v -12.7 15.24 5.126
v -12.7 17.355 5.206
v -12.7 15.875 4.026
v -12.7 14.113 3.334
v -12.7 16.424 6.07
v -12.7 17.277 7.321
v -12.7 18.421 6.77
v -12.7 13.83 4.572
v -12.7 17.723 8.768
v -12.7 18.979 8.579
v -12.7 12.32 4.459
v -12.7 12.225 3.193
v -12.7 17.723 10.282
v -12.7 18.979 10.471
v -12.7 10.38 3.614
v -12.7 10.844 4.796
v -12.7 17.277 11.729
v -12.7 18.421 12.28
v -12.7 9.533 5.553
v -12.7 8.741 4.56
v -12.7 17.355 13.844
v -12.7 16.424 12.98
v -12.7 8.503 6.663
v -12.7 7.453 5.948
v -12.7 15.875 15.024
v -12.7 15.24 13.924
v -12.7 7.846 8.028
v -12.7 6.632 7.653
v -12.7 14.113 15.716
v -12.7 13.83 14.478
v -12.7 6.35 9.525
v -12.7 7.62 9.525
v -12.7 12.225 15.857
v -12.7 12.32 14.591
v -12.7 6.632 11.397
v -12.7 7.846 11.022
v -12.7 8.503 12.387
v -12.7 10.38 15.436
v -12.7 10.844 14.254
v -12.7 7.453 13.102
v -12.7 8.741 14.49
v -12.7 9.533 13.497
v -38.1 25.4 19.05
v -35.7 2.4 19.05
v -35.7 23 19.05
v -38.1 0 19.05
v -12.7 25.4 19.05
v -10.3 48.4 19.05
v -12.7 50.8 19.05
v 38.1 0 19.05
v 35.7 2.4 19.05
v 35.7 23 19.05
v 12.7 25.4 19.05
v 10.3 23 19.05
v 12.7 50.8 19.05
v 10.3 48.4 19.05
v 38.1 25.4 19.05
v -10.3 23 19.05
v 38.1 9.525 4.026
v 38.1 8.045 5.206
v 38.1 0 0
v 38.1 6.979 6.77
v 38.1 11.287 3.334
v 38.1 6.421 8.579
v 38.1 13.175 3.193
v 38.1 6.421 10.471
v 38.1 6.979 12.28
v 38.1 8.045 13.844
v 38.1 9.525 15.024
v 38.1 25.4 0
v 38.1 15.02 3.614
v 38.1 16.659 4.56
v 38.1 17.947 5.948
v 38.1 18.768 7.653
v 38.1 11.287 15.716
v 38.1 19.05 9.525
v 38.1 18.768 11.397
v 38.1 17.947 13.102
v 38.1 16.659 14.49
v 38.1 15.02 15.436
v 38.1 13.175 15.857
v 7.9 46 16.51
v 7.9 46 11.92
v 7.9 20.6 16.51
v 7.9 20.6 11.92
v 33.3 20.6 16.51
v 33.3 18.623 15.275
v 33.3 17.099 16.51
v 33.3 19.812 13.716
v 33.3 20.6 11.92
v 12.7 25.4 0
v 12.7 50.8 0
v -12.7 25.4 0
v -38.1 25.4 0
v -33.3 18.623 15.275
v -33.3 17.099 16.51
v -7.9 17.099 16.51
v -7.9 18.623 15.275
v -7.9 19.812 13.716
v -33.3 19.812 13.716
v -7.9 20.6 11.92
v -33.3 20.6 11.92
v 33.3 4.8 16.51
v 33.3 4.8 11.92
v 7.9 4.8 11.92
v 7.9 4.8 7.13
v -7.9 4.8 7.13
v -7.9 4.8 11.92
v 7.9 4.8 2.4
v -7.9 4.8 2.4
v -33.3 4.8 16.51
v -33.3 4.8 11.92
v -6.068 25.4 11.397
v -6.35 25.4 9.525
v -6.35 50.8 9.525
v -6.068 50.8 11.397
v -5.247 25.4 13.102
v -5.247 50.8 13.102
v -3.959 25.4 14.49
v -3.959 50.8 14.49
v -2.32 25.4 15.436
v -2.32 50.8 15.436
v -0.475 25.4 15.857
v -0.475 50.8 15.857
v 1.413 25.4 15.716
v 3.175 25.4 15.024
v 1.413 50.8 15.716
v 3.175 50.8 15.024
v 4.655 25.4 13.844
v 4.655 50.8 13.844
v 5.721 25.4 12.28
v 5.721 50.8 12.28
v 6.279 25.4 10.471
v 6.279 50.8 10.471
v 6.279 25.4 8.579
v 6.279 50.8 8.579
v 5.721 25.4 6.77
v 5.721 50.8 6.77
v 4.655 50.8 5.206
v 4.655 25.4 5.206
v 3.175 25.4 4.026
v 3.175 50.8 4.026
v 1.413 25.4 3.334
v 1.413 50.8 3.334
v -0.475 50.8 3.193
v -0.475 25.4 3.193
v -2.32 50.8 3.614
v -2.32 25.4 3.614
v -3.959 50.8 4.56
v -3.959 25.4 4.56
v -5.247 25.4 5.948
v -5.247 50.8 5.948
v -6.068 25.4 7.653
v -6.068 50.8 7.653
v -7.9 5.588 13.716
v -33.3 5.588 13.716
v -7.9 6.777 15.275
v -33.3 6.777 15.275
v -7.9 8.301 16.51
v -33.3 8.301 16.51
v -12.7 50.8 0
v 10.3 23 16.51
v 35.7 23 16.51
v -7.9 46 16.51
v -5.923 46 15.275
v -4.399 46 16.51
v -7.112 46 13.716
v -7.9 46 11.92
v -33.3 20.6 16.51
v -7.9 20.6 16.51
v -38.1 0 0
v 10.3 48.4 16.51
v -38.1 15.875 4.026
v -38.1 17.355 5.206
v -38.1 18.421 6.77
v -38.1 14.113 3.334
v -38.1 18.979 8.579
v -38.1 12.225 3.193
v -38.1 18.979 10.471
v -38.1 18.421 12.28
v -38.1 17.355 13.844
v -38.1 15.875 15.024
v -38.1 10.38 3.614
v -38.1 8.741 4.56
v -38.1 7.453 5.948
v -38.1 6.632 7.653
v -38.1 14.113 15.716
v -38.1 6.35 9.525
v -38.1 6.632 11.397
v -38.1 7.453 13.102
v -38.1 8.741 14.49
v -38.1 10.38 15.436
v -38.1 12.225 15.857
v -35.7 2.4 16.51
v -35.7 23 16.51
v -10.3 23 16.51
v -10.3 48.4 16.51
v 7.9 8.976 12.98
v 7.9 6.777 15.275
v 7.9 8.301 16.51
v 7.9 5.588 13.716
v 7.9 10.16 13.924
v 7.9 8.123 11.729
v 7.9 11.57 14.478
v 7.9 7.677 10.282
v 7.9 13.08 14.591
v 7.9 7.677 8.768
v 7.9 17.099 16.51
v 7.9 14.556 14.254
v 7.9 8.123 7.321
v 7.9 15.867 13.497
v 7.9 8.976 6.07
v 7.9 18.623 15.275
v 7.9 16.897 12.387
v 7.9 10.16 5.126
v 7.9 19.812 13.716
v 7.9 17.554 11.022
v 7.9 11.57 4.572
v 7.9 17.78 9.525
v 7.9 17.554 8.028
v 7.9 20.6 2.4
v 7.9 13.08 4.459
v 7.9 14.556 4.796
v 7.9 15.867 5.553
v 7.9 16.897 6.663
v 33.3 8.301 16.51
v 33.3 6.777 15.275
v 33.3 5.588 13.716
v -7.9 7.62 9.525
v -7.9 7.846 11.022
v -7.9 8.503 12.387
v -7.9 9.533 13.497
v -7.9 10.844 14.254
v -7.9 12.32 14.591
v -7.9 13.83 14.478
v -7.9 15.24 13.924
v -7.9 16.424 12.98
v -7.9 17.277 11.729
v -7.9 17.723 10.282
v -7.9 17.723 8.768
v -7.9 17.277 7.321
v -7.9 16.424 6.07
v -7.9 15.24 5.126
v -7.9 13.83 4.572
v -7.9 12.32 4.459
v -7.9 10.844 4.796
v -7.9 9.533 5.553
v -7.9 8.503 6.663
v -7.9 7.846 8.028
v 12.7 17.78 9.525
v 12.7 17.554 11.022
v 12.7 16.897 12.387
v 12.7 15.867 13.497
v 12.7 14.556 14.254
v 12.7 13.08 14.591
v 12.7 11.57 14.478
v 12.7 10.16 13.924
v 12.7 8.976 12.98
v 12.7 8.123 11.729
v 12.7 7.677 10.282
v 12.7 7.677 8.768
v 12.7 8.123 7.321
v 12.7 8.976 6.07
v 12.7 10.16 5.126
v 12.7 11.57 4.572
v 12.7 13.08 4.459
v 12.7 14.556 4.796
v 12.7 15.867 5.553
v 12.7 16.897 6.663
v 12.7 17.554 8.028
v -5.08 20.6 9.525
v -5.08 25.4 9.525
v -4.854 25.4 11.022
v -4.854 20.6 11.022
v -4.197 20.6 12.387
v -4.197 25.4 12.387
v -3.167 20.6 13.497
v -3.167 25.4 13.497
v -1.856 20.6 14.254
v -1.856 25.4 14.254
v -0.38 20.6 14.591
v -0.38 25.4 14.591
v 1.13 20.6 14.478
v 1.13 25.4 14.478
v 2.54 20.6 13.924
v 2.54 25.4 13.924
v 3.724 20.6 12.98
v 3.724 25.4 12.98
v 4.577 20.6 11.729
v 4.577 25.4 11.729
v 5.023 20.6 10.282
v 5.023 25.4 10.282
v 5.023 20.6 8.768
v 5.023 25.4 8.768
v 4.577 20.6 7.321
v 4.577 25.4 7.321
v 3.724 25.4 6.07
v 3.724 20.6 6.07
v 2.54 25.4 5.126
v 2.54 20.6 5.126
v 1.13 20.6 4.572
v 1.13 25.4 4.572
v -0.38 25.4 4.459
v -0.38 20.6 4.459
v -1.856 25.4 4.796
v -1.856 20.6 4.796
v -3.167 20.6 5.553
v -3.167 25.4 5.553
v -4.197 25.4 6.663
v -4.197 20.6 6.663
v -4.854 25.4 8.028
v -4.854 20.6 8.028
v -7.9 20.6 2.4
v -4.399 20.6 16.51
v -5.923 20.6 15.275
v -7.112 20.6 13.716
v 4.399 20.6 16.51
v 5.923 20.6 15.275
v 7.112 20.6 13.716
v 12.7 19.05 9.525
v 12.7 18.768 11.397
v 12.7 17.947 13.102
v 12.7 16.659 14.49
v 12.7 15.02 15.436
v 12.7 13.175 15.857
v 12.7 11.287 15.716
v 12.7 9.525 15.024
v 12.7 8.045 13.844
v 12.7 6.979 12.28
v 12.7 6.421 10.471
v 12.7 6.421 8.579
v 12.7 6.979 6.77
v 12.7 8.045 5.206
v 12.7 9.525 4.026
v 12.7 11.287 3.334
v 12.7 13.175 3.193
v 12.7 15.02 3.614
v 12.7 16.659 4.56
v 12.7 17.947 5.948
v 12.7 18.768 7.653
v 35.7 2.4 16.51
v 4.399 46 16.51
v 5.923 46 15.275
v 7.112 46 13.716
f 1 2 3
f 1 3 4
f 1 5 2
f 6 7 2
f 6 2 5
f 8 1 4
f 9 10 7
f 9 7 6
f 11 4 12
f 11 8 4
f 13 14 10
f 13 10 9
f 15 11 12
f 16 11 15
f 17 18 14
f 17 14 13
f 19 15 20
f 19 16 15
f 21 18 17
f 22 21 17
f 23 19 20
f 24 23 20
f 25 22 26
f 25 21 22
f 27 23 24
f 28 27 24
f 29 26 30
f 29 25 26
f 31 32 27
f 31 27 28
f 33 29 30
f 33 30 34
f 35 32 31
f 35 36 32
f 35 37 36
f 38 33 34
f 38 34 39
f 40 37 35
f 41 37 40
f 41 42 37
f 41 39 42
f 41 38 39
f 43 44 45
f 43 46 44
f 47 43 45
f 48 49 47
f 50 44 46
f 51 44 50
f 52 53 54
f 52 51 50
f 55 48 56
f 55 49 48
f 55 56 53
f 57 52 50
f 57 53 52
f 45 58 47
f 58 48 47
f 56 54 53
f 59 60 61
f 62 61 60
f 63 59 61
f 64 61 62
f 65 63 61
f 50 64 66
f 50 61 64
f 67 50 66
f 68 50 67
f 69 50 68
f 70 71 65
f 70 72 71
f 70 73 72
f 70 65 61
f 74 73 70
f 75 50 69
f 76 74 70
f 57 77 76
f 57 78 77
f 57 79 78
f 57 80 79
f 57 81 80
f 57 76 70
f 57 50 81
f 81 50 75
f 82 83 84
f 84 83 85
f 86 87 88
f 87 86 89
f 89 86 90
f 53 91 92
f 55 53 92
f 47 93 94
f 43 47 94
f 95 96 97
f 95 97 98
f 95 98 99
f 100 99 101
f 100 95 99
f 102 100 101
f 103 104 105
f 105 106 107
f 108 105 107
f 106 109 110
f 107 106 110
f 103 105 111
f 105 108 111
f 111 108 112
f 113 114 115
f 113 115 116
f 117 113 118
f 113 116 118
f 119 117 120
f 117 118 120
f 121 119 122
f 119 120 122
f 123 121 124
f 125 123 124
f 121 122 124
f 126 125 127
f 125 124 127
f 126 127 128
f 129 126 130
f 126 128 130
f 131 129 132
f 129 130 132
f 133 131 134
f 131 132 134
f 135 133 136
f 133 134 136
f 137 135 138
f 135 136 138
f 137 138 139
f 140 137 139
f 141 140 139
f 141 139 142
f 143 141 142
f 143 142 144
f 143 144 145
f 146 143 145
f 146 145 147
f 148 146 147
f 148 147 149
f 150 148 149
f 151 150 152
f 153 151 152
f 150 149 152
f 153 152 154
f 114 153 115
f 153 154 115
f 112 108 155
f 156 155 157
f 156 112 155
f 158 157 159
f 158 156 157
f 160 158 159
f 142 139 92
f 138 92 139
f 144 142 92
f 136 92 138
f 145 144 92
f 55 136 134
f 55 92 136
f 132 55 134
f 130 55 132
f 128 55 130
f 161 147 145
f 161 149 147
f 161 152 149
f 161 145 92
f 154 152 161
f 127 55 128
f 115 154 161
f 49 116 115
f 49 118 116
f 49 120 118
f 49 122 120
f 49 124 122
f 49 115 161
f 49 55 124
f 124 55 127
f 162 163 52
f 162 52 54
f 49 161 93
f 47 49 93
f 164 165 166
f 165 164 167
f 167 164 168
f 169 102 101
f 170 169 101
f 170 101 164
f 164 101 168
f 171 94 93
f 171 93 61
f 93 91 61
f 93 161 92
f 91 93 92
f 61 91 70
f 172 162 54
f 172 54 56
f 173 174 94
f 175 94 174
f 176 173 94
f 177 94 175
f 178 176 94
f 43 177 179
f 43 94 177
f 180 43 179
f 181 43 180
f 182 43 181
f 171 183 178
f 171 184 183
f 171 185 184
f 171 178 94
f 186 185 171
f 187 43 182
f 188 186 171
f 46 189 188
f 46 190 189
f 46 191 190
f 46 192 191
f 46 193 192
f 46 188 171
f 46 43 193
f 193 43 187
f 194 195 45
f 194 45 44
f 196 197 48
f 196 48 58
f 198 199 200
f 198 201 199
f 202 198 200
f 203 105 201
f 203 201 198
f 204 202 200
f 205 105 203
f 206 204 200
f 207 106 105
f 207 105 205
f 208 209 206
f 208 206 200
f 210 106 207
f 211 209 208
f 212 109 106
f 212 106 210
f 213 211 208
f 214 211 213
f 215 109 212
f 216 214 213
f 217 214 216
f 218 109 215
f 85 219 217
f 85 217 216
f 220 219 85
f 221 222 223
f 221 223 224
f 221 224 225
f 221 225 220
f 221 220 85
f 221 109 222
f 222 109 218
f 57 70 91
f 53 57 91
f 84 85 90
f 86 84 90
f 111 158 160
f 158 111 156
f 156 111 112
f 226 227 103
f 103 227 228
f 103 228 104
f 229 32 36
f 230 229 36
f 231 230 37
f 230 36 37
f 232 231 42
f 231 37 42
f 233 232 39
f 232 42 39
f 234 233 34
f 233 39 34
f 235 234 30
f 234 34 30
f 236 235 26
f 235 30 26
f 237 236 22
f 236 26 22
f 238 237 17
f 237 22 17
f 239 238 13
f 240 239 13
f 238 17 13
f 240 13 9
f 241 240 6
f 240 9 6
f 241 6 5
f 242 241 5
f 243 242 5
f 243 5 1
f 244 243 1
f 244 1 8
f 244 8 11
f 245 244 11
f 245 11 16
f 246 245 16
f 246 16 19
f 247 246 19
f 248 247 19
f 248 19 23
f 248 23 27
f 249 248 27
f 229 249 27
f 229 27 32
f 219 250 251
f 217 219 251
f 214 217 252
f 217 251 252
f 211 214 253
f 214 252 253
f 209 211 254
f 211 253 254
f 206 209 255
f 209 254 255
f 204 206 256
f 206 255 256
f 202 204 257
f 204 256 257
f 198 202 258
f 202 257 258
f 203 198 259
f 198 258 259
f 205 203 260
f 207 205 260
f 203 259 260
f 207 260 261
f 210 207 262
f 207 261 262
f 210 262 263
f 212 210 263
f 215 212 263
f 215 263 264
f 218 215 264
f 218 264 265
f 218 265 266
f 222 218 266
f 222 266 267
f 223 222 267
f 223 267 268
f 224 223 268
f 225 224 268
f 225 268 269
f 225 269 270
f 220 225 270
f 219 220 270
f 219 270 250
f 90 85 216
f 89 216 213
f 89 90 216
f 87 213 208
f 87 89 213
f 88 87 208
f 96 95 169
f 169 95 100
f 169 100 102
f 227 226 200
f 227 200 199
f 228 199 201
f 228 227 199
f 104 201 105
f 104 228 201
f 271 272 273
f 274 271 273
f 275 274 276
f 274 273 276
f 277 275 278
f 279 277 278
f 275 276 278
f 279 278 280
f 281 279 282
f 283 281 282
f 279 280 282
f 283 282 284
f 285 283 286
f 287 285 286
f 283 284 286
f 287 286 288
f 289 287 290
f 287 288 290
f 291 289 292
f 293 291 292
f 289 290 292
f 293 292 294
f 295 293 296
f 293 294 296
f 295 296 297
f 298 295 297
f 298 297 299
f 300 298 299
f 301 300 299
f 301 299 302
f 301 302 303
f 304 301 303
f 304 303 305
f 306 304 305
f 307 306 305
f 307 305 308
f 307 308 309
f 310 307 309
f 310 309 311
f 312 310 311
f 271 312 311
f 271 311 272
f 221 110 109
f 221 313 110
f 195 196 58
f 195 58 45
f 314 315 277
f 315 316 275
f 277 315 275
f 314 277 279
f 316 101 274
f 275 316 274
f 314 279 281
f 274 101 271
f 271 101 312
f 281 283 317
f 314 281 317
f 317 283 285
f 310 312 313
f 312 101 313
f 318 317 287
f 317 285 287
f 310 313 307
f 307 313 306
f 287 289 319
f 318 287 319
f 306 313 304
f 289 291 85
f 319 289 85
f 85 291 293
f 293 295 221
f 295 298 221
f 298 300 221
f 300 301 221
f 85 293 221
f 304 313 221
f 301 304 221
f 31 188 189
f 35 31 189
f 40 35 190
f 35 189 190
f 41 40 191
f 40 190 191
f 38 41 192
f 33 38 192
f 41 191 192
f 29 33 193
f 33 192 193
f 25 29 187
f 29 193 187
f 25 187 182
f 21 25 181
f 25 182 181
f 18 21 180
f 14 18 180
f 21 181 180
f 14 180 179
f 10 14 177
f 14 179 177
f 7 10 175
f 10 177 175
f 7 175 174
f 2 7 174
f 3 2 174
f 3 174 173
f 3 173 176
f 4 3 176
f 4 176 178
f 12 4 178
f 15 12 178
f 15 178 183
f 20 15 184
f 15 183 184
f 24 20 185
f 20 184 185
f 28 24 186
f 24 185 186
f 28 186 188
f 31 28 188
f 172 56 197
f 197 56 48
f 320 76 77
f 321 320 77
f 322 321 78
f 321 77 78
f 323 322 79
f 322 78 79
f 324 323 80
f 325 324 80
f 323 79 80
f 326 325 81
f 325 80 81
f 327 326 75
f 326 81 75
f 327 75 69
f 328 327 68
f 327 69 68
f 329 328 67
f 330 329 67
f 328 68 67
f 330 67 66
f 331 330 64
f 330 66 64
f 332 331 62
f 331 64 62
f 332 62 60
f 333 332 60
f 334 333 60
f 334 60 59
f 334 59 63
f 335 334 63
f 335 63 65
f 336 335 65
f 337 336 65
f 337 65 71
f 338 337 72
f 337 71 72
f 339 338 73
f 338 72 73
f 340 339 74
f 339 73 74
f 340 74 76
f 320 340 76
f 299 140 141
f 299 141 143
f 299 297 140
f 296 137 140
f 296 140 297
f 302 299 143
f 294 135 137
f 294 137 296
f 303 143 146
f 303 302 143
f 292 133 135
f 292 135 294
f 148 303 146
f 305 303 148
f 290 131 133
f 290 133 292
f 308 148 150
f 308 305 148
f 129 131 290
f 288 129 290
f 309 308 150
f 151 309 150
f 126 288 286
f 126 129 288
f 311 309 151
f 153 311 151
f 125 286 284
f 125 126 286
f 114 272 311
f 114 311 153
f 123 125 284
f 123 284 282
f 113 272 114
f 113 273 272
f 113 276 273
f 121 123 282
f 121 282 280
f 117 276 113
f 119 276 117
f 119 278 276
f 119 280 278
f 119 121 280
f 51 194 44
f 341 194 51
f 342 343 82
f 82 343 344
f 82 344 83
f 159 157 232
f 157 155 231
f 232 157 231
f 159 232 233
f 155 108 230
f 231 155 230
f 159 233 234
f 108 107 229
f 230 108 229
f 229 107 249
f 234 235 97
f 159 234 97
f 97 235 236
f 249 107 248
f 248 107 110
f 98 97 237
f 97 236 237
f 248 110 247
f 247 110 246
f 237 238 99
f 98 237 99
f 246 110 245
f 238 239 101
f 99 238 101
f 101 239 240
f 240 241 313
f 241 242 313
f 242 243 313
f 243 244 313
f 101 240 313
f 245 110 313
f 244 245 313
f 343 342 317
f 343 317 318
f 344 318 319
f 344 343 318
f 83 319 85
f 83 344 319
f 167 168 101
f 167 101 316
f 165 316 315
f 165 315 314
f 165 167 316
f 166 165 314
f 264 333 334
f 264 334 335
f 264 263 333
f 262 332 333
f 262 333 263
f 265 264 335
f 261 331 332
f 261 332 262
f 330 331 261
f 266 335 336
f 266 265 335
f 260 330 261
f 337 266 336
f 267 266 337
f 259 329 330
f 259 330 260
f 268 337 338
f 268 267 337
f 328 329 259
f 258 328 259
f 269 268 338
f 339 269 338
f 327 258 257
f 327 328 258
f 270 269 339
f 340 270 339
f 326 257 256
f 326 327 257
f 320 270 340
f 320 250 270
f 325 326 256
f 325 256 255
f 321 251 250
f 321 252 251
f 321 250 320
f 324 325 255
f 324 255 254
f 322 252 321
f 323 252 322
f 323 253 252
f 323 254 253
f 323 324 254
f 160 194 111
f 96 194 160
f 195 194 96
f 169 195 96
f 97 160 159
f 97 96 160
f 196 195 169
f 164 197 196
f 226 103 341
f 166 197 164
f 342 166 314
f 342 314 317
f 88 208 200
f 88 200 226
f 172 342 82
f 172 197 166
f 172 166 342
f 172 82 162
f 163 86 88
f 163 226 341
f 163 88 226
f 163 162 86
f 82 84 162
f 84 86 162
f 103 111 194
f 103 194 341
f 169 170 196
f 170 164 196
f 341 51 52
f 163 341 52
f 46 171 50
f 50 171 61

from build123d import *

# Parameters (mm, degrees)
F1_DEPTH  = 19.05
F2_T      = -2.4
F4_DEPTH  = 14.11
F5_R      = 8.255
F5_R_2    = 6.35
F5_R_3    = 5.08
F6_DEPTH  = 30.2
F7_DEPTH  = 25.4
F8_DEPTH  = 34.5948
F9_R      = 8.255
F9_R_2    = 6.35
F9_R_3    = 5.08
F10_DEPTH = 30.2
F11_DEPTH = 25.4
F12_DEPTH = 36.9316
F13_R     = 8.255
F13_R_2   = 6.35
F13_R_3   = 5.08
F14_DEPTH = 30.2
F15_DEPTH = 25.4
F16_DEPTH = 31.242
F17_W     = 3.7311392443
F17_H     = 25.4
F17_W_2   = 25.4
F17_H_2   = 3.7311392443
F20_DEPTH = 2.54


with BuildPart() as f1:
    # F0 (on Top) → F1 (new body)
    with BuildSketch(Plane.XY):
        Polygon((-12.7, 25.4), (-38.1, 25.4), (-38.1, 0), (38.1, 0), (38.1, 25.4), (12.7, 25.4), (12.7, 50.8), (-12.7, 50.8), align=None)
    extrude(amount=F1_DEPTH)

    # F2
    f2_openings = [f1.faces().sort_by_distance(p)[0] for p in [
        (0, 19.05, 19.05),
    ]]
    offset(amount=F2_T, openings=f2_openings, kind=Kind.INTERSECTION)

    # F3 (on face) → F4 (join, through all)
    with BuildSketch(Plane.XY.offset(2.4)):
        Polygon((10.3, 48.4), (-10.3, 48.4), (-10.3, 23), (-35.7, 23), (-35.7, 2.4), (35.7, 2.4), (35.7, 23), (10.3, 23), align=None)
        Polygon((-33.3, 4.8), (-33.3, 20.6), (-7.9, 20.6), (-7.9, 46), (7.9, 46), (7.9, 20.6), (33.3, 20.6), (33.3, 4.8), align=None, mode=Mode.SUBTRACT)
    extrude(amount=F4_DEPTH)

    # F5 (on face) → F6 (join, through all)
    with BuildSketch(Plane(origin=(0, 50.8, 0), x_dir=(-1, 0, 0), z_dir=(0, 1, 0))):
        with Locations((0, 9.525)):
            Circle(F5_R)
        with Locations((0, 9.525)):
            Circle(F5_R_2, mode=Mode.SUBTRACT)
        with Locations((0, 9.525)):
            Circle(F5_R_2)
        with Locations((0, 9.525)):
            Circle(F5_R_3, mode=Mode.SUBTRACT)
        with Locations((0, 9.525)):
            Circle(F5_R_3)
    extrude(amount=-F6_DEPTH)

    # F5 (on face) → F7 (cut)
    with BuildSketch(Plane(origin=(0, 50.8, 0), x_dir=(-1, 0, 0), z_dir=(0, 1, 0))):
        with Locations((0, 9.525)):
            Circle(F5_R_2)
        with Locations((0, 9.525)):
            Circle(F5_R_3, mode=Mode.SUBTRACT)
        with Locations((0, 9.525)):
            Circle(F5_R_3)
    extrude(amount=-F7_DEPTH, mode=Mode.SUBTRACT)

    # F5 (on face) → F8 (cut)
    with BuildSketch(Plane(origin=(0, 50.8, 0), x_dir=(-1, 0, 0), z_dir=(0, 1, 0))):
        with Locations((0, 9.525)):
            Circle(F5_R_3)
    extrude(amount=-F8_DEPTH, mode=Mode.SUBTRACT)

    # F9 (on face) → F10 (join, through all)
    with BuildSketch(Plane.YZ.offset(38.1)):
        with Locations((12.7, 9.525)):
            Circle(F9_R)
        with Locations((12.7, 9.525)):
            Circle(F9_R_2, mode=Mode.SUBTRACT)
        with Locations((12.7, 9.525)):
            Circle(F9_R_2)
        with Locations((12.7, 9.525)):
            Circle(F9_R_3, mode=Mode.SUBTRACT)
        with Locations((12.7, 9.525)):
            Circle(F9_R_3)
    extrude(amount=-F10_DEPTH)

    # F9 (on face) → F11 (cut)
    with BuildSketch(Plane.YZ.offset(38.1)):
        with Locations((12.7, 9.525)):
            Circle(F9_R_2)
        with Locations((12.7, 9.525)):
            Circle(F9_R_3, mode=Mode.SUBTRACT)
    extrude(amount=-F11_DEPTH, mode=Mode.SUBTRACT)

    # F9 (on face) → F12 (cut)
    with BuildSketch(Plane.YZ.offset(38.1)):
        with Locations((12.7, 9.525)):
            Circle(F9_R_3)
    extrude(amount=-F12_DEPTH, mode=Mode.SUBTRACT)

    # F13 (on face) → F14 (join, through all)
    with BuildSketch(Plane(origin=(-38.1, 0, 0), x_dir=(0, -1, 0), z_dir=(-1, 0, 0))):
        with Locations((-12.7, 9.525)):
            Circle(F13_R)
        with Locations((-12.7, 9.525)):
            Circle(F13_R_2, mode=Mode.SUBTRACT)
        with Locations((-12.7, 9.525)):
            Circle(F13_R_2)
        with Locations((-12.7, 9.525)):
            Circle(F13_R_3, mode=Mode.SUBTRACT)
        with Locations((-12.7, 9.525)):
            Circle(F13_R_3)
    extrude(amount=-F14_DEPTH)

    # F13 (on face) → F15 (cut)
    with BuildSketch(Plane(origin=(-38.1, 0, 0), x_dir=(0, -1, 0), z_dir=(-1, 0, 0))):
        with Locations((-12.7, 9.525)):
            Circle(F13_R_2)
        with Locations((-12.7, 9.525)):
            Circle(F13_R_3, mode=Mode.SUBTRACT)
        with Locations((-12.7, 9.525)):
            Circle(F13_R_3)
    extrude(amount=-F15_DEPTH, mode=Mode.SUBTRACT)

    # F13 (on face) → F16 (cut)
    with BuildSketch(Plane(origin=(-38.1, 0, 0), x_dir=(0, -1, 0), z_dir=(-1, 0, 0))):
        with Locations((-12.7, 9.525)):
            Circle(F13_R_3)
    extrude(amount=-F16_DEPTH, mode=Mode.SUBTRACT)

    # F17 (on face) → F18 (join, up to the next surface of F1)
    with BuildSketch(Plane.XY.offset(2.4)):
        with Locations((-6.0344303778, 33.3)):
            Rectangle(F17_W, F17_H)
        with Locations((-20.6, 18.7344303778)):
            Rectangle(F17_W_2, F17_H_2)
        with Locations((6.0344303778, 33.3)):
            Rectangle(F17_W, F17_H)
        with Locations((-20.6, 6.6655696222)):
            Rectangle(F17_W_2, F17_H_2)
        with Locations((20.6, 18.7344303778)):
            Rectangle(F17_W_2, F17_H_2)
        with Locations((20.6, 6.6655696222)):
            Rectangle(F17_W_2, F17_H_2)
    extrude(until=Until.NEXT)

    # F19 (on face) → F20 (cut, through all)
    with BuildSketch(Plane.XY.offset(19.05)):
        Polygon((-10.3, 23), (-35.7, 23), (-35.7, 2.4), (35.7, 2.4), (35.7, 23), (10.3, 23), (10.3, 48.4), (-10.3, 48.4), align=None)
        Polygon((7.9, 46), (7.9, 20.6), (33.3, 20.6), (33.3, 17.0994090512), (33.3, 8.3005909488), (33.3, 4.8), (7.9, 4.8), (-7.9, 4.8), (-33.3, 4.8), (-33.3, 8.3005909488), (-33.3, 17.0994090512), (-33.3, 20.6), (-7.9, 20.6), (-7.9, 46), (-4.3994090512, 46), (4.3994090512, 46), align=None, mode=Mode.SUBTRACT)
        Polygon((-7.9, 20.6), (7.9, 20.6), (7.9, 46), (4.3994090512, 46), (-4.3994090512, 46), (-7.9, 46), align=None)
        Polygon((-7.9, 4.8), (-7.9, 20.6), (-33.3, 20.6), (-33.3, 17.0994090512), (-33.3, 8.3005909488), (-33.3, 4.8), align=None)
        Polygon((33.3, 20.6), (7.9, 20.6), (7.9, 4.8), (33.3, 4.8), (33.3, 8.3005909488), (33.3, 17.0994090512), align=None)
    extrude(amount=-F20_DEPTH, mode=Mode.SUBTRACT)


solid = f1.part
